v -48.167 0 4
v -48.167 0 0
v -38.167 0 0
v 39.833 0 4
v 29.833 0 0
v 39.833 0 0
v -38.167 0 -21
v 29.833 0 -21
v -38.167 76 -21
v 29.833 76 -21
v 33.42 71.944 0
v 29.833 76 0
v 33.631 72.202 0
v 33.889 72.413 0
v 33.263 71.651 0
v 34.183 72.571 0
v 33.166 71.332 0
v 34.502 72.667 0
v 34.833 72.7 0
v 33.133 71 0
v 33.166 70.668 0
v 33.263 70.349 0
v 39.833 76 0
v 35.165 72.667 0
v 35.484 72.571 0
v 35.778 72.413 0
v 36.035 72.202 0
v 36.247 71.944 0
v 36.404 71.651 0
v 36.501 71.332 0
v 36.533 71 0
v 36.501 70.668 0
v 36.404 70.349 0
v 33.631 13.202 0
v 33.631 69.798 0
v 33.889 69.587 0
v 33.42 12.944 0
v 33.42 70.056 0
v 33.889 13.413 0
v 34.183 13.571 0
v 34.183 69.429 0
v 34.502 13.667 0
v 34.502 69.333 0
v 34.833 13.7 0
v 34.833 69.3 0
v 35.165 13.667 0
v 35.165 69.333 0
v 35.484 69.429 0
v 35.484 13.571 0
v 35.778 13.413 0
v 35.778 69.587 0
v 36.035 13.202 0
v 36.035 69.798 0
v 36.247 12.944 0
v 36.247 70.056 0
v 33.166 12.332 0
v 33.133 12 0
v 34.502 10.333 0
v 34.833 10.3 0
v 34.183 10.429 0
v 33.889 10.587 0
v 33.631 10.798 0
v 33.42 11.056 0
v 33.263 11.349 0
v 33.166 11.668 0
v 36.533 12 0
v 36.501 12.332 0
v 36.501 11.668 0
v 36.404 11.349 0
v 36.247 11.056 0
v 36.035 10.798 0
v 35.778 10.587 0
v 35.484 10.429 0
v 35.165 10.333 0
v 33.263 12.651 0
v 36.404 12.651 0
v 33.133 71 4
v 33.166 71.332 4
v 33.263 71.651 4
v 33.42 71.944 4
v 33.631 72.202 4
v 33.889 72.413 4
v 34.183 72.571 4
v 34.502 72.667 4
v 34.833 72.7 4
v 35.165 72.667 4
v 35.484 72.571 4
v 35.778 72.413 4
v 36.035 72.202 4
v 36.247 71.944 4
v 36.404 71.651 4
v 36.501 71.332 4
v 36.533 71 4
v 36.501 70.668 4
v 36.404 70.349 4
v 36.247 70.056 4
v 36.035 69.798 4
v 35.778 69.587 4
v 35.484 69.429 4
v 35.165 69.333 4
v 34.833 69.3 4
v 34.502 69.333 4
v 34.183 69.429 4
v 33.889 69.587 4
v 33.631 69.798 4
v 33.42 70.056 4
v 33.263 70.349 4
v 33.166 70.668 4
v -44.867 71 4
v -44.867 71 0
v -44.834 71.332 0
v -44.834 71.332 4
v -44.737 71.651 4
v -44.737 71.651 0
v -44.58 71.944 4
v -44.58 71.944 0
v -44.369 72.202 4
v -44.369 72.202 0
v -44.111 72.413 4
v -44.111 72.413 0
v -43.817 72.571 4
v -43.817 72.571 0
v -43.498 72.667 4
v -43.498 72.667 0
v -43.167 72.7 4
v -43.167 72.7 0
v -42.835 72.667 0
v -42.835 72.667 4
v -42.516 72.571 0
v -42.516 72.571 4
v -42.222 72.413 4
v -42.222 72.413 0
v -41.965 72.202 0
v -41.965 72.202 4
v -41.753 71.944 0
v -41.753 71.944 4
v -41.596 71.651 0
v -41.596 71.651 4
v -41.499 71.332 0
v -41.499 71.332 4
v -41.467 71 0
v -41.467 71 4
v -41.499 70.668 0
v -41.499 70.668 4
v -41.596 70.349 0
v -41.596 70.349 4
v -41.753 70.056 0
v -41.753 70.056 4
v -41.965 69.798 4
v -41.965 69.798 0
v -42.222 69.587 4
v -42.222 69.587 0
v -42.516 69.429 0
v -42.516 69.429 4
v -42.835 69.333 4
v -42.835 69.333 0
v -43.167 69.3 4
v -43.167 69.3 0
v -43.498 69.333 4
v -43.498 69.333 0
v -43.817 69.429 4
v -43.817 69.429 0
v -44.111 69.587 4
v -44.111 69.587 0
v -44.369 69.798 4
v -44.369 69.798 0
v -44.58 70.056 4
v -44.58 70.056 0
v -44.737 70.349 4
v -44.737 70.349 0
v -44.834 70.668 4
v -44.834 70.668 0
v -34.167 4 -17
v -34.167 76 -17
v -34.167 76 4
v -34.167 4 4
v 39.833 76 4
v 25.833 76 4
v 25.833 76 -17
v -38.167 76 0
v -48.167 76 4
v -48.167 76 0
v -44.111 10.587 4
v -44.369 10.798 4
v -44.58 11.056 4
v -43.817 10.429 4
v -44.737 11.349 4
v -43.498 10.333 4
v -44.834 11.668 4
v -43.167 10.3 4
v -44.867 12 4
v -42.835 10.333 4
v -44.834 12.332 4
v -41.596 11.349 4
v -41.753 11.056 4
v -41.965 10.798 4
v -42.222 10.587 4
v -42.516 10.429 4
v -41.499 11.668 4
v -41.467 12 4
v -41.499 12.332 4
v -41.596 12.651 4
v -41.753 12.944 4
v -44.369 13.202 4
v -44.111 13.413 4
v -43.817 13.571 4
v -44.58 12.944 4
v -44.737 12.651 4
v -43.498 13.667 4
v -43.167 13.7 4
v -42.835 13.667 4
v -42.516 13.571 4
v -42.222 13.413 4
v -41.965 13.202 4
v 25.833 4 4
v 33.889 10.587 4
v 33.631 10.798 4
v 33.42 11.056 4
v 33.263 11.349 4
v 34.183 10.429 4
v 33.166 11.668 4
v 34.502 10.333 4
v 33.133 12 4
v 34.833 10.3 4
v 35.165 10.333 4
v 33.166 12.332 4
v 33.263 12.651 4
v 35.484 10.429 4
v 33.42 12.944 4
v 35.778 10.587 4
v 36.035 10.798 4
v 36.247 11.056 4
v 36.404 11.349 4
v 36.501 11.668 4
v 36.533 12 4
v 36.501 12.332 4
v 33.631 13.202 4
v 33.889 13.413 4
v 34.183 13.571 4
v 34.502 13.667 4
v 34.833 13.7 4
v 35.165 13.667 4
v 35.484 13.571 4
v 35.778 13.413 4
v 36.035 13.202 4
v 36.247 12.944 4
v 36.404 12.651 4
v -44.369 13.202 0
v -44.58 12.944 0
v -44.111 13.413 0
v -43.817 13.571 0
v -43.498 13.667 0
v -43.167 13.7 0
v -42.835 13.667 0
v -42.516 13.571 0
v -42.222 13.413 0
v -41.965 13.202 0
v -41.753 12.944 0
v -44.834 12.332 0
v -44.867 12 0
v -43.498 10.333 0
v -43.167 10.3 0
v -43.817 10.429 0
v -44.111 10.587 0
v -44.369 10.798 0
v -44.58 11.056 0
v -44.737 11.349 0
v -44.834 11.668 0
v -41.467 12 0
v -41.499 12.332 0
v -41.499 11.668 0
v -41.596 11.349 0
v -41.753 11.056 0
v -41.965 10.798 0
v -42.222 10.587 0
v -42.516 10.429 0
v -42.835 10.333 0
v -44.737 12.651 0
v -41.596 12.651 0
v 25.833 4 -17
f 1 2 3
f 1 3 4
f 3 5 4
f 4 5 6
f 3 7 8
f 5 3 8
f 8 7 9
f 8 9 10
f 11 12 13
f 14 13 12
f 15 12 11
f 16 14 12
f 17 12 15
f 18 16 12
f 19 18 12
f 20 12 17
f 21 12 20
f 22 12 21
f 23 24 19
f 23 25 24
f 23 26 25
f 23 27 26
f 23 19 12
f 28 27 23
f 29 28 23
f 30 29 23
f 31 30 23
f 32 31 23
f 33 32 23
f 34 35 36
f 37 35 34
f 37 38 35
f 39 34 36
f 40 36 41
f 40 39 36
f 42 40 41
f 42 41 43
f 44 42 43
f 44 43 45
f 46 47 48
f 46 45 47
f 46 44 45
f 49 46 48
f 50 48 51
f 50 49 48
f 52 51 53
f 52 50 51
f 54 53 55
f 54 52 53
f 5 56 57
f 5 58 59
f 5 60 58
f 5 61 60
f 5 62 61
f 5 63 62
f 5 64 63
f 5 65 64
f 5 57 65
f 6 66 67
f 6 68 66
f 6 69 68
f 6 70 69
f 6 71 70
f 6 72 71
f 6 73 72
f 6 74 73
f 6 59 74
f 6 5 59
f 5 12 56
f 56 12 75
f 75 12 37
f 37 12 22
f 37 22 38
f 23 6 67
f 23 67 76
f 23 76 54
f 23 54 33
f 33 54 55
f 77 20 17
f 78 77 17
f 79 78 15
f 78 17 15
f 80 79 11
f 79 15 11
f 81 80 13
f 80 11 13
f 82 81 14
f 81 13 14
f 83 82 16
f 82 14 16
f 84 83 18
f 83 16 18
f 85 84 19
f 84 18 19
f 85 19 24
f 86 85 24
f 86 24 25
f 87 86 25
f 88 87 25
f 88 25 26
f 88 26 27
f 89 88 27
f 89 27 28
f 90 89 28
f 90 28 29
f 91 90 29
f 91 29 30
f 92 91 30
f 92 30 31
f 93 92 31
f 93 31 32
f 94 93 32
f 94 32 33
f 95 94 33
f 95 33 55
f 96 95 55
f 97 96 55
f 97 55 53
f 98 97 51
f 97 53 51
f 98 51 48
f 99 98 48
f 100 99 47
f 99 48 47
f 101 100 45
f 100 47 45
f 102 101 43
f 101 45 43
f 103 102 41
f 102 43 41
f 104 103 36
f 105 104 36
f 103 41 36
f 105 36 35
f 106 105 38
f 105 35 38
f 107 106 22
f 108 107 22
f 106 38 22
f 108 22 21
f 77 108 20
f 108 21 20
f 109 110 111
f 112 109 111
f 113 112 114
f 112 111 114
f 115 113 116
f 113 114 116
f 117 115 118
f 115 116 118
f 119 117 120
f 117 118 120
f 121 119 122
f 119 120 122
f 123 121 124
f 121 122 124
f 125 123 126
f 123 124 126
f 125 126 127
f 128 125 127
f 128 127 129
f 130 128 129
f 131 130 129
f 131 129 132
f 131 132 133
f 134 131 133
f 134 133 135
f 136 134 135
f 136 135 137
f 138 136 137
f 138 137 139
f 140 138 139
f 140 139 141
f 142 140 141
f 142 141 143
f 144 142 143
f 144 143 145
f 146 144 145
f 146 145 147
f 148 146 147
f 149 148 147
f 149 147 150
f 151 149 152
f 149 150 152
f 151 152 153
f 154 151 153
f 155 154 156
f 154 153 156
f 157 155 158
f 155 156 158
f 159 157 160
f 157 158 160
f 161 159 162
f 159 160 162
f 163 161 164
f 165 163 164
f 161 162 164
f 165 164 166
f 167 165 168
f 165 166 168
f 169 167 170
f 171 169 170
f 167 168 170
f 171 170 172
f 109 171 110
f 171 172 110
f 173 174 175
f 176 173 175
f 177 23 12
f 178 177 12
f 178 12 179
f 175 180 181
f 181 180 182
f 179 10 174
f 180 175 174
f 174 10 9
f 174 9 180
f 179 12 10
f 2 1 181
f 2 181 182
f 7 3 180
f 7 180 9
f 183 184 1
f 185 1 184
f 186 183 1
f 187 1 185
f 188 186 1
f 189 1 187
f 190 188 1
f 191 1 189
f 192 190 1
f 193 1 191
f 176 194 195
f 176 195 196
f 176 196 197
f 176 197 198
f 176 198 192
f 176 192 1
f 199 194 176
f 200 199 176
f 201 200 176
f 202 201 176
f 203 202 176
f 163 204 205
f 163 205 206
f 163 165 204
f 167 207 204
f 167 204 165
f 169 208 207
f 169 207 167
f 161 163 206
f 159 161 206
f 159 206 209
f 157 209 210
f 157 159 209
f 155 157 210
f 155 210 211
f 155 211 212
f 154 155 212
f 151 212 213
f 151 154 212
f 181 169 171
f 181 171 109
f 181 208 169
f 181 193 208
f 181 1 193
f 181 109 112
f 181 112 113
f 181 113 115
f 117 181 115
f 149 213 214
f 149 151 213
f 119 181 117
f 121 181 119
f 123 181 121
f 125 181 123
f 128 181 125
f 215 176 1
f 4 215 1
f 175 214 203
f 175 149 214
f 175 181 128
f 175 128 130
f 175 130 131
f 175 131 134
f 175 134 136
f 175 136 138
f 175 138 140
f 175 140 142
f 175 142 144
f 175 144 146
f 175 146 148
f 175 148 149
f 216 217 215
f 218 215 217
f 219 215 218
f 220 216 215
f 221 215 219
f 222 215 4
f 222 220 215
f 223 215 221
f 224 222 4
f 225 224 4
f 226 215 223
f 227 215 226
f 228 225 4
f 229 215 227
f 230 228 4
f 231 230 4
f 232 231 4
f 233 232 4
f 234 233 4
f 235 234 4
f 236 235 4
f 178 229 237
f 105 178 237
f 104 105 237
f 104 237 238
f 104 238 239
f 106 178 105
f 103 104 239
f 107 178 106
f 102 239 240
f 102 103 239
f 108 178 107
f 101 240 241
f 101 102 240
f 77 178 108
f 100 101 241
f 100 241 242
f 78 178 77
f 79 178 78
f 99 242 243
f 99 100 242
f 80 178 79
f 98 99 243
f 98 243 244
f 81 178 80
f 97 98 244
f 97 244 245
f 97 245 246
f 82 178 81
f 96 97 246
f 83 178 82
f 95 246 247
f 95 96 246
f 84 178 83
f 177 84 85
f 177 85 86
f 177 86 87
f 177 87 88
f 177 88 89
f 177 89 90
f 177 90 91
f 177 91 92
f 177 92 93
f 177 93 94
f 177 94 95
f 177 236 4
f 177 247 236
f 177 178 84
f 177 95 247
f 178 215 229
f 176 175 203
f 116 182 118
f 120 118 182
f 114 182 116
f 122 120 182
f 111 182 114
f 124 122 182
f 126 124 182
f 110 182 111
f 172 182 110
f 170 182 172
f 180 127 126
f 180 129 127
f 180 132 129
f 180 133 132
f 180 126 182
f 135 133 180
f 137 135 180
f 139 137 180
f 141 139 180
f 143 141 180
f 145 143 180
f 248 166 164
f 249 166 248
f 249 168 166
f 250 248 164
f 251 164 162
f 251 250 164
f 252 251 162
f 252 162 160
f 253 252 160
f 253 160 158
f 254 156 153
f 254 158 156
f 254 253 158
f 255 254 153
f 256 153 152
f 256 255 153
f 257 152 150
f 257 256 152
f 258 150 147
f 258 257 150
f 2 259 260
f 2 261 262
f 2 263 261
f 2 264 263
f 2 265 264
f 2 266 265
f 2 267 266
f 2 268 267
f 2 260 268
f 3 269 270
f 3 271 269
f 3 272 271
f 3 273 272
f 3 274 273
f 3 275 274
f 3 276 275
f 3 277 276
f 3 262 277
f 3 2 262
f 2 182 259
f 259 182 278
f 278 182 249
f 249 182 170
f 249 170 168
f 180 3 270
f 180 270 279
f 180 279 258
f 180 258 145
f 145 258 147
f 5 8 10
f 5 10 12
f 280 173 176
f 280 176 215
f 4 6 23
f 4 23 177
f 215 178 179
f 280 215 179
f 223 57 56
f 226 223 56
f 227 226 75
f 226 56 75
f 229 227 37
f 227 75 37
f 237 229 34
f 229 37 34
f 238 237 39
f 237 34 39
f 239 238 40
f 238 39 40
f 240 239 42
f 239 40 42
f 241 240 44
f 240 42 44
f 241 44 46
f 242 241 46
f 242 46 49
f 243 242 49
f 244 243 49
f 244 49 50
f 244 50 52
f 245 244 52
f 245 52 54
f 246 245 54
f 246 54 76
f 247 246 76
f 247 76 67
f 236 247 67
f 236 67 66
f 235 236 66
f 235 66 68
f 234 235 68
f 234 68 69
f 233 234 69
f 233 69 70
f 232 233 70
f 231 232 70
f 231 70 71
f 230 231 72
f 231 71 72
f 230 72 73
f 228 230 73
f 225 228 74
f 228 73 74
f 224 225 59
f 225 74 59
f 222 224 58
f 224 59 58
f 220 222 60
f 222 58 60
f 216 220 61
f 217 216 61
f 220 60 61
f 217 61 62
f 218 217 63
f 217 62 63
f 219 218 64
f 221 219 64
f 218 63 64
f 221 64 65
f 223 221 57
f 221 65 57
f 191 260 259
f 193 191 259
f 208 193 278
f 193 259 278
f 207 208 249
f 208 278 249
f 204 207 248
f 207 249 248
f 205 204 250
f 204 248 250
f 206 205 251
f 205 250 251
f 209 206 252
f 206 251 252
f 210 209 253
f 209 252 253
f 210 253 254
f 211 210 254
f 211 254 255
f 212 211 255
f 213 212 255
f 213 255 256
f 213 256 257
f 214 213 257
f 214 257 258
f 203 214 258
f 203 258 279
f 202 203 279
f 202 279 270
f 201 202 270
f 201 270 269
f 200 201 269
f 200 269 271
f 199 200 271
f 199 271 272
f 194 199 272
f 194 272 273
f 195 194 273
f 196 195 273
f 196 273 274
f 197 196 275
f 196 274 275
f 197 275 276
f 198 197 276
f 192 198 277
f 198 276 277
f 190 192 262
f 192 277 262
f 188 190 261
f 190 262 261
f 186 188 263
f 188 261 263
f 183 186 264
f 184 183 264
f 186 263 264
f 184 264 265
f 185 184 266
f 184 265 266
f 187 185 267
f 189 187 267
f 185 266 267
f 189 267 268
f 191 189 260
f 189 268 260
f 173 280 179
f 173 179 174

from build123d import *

# Parameters (mm, degrees)
BOSS_EXTRUDE1_DEPTH = 76
SKETCH2_W           = 60
SKETCH2_H           = 4
EXTRUDE_THIN1_DEPTH = 21
SKETCH4_R           = 1.7
CUT_EXTRUDE1_DEPTH  = 21


with BuildPart() as part:
    # Sketch1 → Boss-Extrude1 (new body)
    with BuildSketch(Plane(origin=(0, 0, 0), x_dir=(1, 0, 0), z_dir=(0, 1, 0))):
        Polygon((-48.166666667, 0), (-38.166666667, 0), (-38.166666667, 21), (29.833333333, 21), (29.833333333, 0), (39.833333333, 0), (39.833333333, -4), (25.833333333, -4), (25.833333333, 17), (-34.166666667, 17), (-34.166666667, -4), (-48.166666667, -4), align=None)
    extrude(amount=BOSS_EXTRUDE1_DEPTH)

    # Sketch2 → Extrude-Thin1 (add)
    with BuildSketch(Plane.XY.offset(-17)):
        with Locations((-4.166666667, 2)):
            Rectangle(SKETCH2_W, SKETCH2_H)
    extrude(amount=EXTRUDE_THIN1_DEPTH)

    # Sketch4 → Cut-Extrude1 (cut)
    with BuildSketch(Plane(origin=(0, 0, 0), x_dir=(-1, 0, 0), z_dir=(0, 0, -1))):
        with Locations((-34.833333333, 71)):
            Circle(SKETCH4_R)
        with Locations((-34.833333333, 12)):
            Circle(SKETCH4_R)
        with Locations((43.166666667, 71)):
            Circle(SKETCH4_R)
        with Locations((43.166666667, 12)):
            Circle(SKETCH4_R)
    extrude(amount=-CUT_EXTRUDE1_DEPTH, mode=Mode.SUBTRACT)


solid = part.part
